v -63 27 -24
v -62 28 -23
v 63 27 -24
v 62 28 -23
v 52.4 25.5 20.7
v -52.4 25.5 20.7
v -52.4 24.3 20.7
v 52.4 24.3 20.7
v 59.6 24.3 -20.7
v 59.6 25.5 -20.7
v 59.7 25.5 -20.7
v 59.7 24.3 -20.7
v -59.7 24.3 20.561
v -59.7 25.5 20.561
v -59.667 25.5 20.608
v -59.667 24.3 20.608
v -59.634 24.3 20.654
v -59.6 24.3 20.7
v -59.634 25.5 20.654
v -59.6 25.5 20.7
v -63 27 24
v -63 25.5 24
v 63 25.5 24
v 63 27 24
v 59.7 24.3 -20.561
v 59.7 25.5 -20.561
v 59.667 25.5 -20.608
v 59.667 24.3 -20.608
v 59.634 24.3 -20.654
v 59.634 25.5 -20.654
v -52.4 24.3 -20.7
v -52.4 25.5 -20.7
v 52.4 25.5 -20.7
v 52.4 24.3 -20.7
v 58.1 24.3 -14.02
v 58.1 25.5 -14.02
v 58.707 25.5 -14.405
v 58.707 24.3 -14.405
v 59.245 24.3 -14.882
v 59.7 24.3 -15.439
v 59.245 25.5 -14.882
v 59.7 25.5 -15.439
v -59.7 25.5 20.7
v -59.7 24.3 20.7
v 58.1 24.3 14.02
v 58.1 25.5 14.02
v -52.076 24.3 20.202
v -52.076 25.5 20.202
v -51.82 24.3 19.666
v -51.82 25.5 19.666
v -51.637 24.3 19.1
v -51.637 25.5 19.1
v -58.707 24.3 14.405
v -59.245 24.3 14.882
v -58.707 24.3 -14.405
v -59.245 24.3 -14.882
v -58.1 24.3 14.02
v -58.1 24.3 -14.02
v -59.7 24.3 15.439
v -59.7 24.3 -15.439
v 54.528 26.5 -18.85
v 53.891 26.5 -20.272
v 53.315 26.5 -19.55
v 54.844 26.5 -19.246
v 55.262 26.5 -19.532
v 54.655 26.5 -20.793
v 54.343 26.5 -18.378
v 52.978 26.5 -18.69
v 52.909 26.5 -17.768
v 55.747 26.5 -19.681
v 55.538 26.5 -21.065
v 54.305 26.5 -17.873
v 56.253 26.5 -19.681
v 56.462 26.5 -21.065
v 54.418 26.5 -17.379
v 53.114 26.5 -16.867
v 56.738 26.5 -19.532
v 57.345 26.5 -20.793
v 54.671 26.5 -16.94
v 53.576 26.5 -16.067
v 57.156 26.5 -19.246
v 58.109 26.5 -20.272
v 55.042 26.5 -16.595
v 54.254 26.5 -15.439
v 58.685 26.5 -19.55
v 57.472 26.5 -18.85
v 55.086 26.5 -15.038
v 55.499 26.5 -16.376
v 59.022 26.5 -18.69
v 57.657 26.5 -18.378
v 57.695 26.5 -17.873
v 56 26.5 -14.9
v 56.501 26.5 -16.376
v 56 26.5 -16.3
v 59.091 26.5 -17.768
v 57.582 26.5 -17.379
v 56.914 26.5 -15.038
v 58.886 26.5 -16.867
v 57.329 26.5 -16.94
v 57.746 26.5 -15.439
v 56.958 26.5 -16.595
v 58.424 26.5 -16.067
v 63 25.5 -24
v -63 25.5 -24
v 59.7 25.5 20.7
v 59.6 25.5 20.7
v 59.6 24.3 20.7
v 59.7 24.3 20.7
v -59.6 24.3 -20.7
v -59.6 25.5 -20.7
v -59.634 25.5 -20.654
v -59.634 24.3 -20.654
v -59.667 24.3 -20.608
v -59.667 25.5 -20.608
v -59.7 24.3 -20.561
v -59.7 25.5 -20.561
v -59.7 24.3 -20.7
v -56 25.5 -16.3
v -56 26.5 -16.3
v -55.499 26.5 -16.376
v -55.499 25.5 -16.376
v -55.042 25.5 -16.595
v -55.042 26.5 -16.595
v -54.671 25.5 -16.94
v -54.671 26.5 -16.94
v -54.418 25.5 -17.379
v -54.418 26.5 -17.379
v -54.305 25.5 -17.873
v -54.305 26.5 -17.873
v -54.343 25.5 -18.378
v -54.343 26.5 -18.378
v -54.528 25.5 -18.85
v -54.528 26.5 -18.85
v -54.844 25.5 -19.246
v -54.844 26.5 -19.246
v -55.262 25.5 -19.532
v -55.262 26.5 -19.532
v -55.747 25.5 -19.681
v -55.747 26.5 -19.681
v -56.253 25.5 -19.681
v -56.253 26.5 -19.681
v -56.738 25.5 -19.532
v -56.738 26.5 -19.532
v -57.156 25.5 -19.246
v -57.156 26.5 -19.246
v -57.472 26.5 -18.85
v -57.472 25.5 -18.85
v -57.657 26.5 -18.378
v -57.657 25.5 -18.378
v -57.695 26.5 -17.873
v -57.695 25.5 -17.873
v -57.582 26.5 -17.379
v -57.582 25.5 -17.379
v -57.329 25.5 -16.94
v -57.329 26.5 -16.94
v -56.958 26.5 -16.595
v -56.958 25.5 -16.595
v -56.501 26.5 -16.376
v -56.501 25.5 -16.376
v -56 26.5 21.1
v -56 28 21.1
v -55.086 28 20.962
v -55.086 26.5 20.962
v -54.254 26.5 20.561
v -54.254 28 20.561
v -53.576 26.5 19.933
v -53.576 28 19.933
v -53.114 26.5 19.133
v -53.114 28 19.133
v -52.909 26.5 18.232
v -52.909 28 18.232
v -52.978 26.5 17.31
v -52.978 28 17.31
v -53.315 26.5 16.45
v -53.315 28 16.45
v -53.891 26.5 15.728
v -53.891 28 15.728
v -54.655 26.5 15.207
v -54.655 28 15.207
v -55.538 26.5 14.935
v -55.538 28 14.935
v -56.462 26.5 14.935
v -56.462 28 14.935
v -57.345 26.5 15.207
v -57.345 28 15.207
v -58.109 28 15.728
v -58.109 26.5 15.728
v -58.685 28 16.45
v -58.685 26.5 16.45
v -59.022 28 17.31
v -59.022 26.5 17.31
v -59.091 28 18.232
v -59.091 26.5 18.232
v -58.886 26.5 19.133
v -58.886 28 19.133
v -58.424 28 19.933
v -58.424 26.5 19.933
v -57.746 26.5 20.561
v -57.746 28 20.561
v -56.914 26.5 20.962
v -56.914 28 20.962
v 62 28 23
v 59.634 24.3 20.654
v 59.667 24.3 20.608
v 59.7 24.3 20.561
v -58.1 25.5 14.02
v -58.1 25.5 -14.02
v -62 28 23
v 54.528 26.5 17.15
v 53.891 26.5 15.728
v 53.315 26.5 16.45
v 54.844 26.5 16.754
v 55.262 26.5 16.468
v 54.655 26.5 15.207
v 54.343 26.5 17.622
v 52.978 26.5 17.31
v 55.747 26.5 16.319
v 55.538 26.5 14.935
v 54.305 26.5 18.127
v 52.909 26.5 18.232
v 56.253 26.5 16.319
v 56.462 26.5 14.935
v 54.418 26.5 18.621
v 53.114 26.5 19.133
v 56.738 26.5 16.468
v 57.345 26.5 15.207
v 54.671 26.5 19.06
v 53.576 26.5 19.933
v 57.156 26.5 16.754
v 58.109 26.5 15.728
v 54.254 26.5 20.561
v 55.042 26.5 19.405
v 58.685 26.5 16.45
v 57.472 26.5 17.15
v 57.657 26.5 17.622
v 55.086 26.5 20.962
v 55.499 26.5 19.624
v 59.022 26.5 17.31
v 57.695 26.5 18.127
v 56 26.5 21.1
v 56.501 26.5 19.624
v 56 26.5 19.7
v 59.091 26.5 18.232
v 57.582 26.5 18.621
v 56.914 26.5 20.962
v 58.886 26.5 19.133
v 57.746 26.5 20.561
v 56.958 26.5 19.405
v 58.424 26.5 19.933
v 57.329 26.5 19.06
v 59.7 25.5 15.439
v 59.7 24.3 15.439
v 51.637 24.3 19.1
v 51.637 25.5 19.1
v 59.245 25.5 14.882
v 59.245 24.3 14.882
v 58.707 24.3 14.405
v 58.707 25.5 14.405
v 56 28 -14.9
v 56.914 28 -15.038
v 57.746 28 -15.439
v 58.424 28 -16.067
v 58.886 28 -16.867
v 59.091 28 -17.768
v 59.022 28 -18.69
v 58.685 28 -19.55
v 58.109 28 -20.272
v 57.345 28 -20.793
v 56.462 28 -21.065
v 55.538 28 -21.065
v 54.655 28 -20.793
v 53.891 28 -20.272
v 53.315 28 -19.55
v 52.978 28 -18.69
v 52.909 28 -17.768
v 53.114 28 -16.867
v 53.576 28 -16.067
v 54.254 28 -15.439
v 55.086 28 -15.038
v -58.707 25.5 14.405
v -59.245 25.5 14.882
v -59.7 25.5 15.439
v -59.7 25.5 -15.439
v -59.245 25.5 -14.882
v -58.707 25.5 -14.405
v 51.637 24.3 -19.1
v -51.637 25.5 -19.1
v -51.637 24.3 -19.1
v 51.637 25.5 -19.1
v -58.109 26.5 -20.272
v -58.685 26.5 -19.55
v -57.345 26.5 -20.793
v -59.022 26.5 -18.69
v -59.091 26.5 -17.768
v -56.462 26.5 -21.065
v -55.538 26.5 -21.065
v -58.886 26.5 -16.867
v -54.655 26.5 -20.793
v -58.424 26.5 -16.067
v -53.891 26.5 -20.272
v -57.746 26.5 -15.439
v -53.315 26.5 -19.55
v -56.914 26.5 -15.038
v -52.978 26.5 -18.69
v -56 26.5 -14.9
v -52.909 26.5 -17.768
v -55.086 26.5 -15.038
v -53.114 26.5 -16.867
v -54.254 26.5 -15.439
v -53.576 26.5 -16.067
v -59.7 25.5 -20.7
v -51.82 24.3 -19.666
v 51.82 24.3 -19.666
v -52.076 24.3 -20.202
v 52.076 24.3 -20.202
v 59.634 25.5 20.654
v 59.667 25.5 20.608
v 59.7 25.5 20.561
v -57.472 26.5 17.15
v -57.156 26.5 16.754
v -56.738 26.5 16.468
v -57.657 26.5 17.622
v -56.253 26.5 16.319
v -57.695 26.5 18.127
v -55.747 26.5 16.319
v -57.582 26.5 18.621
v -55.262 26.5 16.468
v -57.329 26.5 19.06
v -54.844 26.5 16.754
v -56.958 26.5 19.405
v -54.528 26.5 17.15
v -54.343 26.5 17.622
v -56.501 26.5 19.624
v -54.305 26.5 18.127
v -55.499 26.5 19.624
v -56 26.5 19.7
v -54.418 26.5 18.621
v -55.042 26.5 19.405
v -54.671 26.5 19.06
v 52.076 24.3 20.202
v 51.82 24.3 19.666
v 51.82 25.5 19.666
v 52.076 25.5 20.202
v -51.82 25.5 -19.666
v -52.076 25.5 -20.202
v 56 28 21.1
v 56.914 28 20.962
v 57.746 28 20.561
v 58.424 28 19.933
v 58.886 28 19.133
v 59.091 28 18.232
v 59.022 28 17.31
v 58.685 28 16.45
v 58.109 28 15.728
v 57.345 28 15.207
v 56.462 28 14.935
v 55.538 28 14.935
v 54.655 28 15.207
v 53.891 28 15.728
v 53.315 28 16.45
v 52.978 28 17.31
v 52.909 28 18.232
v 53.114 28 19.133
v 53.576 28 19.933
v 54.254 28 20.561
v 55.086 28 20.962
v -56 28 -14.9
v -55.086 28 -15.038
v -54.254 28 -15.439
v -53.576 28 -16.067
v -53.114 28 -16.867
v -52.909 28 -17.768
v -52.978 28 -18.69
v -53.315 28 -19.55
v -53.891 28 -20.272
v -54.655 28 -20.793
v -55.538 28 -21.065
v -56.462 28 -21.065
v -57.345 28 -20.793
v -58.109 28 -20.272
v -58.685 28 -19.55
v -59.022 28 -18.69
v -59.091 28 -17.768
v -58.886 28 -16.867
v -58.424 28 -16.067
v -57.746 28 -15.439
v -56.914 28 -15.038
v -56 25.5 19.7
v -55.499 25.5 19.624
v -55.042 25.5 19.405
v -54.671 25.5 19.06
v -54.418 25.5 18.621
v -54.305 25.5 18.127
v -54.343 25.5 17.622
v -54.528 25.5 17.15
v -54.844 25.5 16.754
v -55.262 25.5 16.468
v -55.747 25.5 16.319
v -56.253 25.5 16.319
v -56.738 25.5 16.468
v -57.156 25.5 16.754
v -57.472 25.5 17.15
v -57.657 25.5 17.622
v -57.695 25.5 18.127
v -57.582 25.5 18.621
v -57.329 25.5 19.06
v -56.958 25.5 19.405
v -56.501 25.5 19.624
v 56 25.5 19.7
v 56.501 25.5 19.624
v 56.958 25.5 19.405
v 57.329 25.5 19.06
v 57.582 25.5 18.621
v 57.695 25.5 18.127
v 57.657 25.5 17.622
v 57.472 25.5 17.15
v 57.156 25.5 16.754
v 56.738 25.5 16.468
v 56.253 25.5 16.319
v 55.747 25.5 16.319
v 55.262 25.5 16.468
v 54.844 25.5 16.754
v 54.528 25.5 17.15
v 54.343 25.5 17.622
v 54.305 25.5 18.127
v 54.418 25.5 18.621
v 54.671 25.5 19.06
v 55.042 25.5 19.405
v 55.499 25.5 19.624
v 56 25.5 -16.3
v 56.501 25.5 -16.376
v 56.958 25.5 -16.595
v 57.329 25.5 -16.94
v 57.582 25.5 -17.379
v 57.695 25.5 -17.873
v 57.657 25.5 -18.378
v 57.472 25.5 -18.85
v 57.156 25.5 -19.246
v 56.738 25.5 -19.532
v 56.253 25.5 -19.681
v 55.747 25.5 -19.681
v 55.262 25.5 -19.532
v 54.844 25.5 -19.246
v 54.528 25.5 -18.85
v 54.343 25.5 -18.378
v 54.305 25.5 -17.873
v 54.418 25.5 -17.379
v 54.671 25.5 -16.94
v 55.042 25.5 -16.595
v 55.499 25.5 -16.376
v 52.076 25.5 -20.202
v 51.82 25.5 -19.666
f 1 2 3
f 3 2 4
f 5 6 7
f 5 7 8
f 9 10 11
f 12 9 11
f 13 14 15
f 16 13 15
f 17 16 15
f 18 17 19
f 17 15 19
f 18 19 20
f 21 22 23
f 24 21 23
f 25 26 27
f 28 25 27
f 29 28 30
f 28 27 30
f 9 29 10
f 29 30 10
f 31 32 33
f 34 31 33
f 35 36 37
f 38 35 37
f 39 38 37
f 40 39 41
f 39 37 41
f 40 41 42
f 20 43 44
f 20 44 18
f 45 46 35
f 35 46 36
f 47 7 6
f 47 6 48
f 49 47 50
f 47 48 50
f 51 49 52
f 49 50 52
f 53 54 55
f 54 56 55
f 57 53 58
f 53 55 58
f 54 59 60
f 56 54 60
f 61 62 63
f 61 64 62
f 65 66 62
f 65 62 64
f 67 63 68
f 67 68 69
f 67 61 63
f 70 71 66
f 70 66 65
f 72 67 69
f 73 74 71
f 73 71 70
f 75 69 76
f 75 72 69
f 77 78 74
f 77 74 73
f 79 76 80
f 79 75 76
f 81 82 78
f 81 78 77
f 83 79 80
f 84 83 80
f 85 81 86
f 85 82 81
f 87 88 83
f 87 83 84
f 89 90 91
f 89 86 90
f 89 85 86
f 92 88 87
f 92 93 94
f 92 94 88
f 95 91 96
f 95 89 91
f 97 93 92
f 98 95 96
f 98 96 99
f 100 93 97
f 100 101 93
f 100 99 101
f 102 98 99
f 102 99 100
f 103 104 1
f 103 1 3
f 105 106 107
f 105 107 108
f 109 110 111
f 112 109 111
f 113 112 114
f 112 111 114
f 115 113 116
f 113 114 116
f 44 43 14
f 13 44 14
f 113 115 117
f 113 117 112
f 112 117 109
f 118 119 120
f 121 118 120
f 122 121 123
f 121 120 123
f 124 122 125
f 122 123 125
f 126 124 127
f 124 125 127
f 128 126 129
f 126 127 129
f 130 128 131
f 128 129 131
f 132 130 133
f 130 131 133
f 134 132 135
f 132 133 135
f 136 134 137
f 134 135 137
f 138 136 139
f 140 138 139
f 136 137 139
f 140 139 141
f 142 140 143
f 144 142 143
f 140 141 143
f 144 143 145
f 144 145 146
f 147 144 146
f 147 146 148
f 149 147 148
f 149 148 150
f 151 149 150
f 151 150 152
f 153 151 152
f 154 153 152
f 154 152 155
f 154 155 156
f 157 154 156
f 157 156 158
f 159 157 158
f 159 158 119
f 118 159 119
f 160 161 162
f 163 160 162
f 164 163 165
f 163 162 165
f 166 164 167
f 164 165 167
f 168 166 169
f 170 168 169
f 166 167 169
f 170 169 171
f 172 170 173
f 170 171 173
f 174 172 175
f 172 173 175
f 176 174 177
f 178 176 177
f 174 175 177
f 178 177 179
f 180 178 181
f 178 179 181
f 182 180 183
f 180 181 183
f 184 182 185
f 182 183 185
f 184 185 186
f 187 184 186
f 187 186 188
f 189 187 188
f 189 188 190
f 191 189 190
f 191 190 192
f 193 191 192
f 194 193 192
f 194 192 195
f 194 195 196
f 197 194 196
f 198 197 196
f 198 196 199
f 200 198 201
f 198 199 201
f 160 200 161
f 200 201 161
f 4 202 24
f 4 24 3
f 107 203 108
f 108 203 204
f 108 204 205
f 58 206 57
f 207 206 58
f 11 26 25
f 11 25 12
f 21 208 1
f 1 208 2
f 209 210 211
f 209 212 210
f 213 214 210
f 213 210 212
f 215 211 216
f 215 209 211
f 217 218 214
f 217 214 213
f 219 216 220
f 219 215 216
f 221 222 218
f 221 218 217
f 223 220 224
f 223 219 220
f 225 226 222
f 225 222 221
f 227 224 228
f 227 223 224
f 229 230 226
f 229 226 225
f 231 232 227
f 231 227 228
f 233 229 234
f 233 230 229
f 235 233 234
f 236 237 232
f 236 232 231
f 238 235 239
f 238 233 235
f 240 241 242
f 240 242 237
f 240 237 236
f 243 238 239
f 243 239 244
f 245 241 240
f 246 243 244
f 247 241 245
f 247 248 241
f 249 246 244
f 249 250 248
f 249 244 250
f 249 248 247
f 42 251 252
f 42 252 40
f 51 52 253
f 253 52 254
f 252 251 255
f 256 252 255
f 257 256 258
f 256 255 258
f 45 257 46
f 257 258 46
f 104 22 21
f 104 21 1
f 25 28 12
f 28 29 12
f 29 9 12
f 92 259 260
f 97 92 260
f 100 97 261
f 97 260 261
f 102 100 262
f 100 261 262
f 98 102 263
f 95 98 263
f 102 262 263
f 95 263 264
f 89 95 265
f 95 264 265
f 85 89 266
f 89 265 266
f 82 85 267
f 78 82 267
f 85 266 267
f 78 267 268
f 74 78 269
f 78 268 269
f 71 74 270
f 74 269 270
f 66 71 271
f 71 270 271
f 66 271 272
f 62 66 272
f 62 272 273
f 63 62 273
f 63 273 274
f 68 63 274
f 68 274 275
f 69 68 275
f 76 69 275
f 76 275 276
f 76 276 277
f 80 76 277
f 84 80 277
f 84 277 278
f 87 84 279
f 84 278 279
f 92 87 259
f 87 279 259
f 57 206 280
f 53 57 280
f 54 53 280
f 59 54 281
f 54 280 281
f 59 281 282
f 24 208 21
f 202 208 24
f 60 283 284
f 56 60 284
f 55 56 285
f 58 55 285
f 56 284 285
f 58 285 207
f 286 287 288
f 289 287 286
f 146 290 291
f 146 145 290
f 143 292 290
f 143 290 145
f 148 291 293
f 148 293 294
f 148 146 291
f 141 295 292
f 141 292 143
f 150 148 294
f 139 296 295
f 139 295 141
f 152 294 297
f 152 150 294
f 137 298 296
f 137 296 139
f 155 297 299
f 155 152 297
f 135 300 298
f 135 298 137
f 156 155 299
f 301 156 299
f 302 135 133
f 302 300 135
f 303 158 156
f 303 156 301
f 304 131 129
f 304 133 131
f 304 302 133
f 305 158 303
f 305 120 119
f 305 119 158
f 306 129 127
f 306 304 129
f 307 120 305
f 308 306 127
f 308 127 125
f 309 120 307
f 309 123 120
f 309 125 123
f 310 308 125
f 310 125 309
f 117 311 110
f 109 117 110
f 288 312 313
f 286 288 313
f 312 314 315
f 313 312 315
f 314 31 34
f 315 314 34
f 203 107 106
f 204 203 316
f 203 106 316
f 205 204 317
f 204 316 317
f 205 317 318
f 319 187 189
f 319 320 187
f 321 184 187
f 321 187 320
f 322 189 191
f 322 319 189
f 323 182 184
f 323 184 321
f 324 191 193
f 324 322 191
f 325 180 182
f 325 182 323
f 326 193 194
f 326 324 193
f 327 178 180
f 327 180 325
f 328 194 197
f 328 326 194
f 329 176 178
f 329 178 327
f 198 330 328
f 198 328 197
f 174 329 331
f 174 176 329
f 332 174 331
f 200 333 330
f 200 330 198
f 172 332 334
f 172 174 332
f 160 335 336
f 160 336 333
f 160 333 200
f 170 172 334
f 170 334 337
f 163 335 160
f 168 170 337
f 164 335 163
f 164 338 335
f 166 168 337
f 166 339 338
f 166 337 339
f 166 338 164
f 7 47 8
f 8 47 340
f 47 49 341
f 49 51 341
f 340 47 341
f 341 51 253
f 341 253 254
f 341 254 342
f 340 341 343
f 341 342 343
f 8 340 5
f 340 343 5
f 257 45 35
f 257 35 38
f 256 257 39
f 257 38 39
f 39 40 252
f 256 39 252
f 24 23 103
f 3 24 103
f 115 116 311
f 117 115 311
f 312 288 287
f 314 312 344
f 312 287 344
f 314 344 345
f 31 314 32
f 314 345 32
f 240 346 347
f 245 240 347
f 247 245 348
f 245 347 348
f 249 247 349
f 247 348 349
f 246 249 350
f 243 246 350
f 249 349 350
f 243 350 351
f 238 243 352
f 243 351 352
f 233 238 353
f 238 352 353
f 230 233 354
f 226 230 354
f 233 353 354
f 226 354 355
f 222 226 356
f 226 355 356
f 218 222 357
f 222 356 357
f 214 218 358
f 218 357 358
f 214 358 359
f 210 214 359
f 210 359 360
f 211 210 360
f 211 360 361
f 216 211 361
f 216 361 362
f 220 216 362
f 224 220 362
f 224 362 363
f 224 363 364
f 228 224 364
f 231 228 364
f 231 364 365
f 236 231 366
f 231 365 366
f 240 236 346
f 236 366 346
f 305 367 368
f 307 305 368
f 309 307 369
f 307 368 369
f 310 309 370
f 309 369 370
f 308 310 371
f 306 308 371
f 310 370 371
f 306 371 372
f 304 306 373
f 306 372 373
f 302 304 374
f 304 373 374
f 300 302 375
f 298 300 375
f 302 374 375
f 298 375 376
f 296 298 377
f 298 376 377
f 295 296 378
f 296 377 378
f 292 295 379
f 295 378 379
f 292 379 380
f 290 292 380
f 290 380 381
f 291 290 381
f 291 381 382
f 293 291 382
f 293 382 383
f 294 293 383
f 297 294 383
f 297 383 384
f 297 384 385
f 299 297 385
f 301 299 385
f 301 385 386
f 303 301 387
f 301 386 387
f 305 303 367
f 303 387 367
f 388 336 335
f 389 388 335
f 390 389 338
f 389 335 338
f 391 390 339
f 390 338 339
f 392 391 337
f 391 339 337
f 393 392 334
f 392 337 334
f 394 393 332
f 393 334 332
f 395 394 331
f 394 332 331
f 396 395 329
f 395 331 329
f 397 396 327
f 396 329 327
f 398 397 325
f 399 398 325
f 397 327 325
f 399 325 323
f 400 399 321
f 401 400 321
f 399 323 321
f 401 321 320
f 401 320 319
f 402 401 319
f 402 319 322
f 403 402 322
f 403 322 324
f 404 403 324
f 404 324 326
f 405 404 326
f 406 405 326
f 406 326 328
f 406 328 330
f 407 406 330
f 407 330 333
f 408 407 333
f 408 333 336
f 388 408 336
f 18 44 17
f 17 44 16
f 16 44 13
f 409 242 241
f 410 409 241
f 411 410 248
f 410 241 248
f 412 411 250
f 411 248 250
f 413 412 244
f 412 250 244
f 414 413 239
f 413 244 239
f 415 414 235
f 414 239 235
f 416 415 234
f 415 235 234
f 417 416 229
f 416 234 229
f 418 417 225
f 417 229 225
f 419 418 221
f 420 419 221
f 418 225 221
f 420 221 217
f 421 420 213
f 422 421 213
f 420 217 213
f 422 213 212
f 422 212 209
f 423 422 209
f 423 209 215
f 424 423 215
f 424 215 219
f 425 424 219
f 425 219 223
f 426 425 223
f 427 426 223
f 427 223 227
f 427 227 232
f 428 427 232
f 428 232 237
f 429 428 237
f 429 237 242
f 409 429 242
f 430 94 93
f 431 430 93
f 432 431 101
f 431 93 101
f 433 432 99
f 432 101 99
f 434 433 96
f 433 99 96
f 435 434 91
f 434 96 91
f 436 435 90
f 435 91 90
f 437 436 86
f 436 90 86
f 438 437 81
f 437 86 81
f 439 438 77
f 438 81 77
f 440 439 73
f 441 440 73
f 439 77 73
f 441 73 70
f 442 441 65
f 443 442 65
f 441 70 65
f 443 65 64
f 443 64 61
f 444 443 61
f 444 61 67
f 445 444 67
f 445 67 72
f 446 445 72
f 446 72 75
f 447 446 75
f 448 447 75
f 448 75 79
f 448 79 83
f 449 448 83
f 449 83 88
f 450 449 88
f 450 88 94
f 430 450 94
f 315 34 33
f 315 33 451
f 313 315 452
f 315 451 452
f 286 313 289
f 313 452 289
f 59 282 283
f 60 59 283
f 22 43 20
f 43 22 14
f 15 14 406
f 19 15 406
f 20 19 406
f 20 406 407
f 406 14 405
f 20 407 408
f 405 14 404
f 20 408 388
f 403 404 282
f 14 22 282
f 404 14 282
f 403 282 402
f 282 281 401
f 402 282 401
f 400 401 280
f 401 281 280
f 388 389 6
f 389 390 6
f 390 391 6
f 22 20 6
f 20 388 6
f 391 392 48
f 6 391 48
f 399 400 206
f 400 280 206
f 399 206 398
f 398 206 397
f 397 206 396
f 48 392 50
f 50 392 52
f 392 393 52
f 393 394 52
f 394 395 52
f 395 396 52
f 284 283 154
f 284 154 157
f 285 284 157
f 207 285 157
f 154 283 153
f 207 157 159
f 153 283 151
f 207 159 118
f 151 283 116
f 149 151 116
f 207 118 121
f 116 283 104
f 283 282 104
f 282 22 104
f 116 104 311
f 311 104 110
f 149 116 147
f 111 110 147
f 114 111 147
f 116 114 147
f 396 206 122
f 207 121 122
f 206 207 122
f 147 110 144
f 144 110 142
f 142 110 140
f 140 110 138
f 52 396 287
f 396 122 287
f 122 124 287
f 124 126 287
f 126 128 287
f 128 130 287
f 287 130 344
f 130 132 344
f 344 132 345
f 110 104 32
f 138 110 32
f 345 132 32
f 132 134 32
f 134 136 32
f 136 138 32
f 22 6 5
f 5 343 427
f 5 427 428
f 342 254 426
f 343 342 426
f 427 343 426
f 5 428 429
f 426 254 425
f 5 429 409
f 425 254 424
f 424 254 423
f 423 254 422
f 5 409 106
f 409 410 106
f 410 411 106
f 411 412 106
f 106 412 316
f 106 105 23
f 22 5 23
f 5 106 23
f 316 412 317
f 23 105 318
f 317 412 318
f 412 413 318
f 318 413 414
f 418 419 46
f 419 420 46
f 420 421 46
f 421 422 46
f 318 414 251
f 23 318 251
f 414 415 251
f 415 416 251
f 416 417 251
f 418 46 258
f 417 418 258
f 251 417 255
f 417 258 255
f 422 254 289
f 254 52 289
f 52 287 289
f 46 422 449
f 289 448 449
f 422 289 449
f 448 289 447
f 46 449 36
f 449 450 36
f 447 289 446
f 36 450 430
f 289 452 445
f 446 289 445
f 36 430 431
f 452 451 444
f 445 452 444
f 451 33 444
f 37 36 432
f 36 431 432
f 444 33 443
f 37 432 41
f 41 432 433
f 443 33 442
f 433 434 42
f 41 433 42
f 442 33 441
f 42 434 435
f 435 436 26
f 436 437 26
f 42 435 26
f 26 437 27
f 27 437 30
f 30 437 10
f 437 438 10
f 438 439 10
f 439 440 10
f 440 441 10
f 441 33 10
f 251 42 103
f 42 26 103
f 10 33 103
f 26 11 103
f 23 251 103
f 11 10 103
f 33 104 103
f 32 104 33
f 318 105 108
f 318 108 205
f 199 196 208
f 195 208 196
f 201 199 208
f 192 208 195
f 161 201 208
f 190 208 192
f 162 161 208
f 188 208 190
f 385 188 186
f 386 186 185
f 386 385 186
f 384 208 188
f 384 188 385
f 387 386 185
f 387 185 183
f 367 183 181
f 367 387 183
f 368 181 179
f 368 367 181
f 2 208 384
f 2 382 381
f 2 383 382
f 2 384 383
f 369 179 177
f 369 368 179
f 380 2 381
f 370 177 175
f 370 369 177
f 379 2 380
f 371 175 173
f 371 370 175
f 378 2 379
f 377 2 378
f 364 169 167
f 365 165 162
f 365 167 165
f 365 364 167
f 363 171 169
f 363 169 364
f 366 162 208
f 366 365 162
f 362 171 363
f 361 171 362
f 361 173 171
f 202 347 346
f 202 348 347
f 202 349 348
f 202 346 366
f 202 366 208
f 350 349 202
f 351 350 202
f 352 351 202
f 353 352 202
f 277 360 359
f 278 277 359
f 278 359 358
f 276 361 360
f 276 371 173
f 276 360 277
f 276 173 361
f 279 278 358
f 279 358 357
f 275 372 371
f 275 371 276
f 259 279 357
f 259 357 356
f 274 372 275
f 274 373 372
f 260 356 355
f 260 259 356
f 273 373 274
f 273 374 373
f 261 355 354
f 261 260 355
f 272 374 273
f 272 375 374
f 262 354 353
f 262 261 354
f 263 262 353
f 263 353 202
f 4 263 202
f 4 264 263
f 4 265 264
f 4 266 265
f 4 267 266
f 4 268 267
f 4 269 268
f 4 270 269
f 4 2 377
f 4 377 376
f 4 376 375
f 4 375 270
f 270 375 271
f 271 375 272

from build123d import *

# Parameters (mm, degrees)
SKETCH1_W           = 126
SKETCH1_H           = 48
BOSS_EXTRUDE1_DEPTH = 2.5
CHAMFER1_SIZE       = 1
SKETCH2_W           = 119.4
SKETCH2_H           = 41.4
SKETCH2_W_2         = 116.2
SKETCH2_H_2         = 38.2
BOSS_EXTRUDE2_DEPTH = 1.2
SKETCH3_R           = 4.5
CUT_EXTRUDE1_DEPTH  = 1.5
SKETCH4_R           = 1.7
CUT_EXTRUDE2_DEPTH  = 68.518071655
SKETCH5_R           = 3.1
CUT_EXTRUDE3_DEPTH  = 1.5


with BuildPart() as part:
    # Sketch1 → Boss-Extrude1 (new body)
    with BuildSketch(Plane(origin=(0, 25.5, 0), x_dir=(1, 0, 0), z_dir=(0, 1, 0))):
        Rectangle(SKETCH1_W, SKETCH1_H)
    extrude(amount=BOSS_EXTRUDE1_DEPTH)

    # Chamfer1
    chamfer1_edges = [part.edges().sort_by_distance(p)[0] for p in [
        (63, 28, 0),
        (0, 28, -24),
        (-63, 28, 0),
        (0, 28, 24),
    ]]
    chamfer(chamfer1_edges, length=CHAMFER1_SIZE)

    # Sketch2 → Boss-Extrude2 (add)
    with BuildSketch(Plane(origin=(0, 25.5, 0), x_dir=(1, 0, 0), z_dir=(0, 1, 0))):
        Rectangle(SKETCH2_W, SKETCH2_H)
        Rectangle(SKETCH2_W_2, SKETCH2_H_2, mode=Mode.SUBTRACT)
    extrude(amount=-BOSS_EXTRUDE2_DEPTH)

    # Sketch3 → Cut-Extrude1 (cut)
    with BuildSketch(Plane(origin=(0, 25.5, 0), x_dir=(1, 0, 0), z_dir=(0, 1, 0))):
        with Locations((-56, 18)):
            Circle(SKETCH3_R)
        with Locations((-56, -18)):
            Circle(SKETCH3_R)
        with Locations((56, 18)):
            Circle(SKETCH3_R)
        with Locations((56, -18)):
            Circle(SKETCH3_R)
    extrude(amount=-CUT_EXTRUDE1_DEPTH, mode=Mode.SUBTRACT)

    # Sketch4 → Cut-Extrude2 (cut, through all)
    with BuildSketch(Plane(origin=(0, 28, 0), x_dir=(1, 0, 0), z_dir=(0, 1, 0))):
        with Locations(Location((-56, 18, 0), (0, 0, 270))):
            Circle(SKETCH4_R)
        with Locations(Location((-56, -18, 0), (0, 0, 270))):
            Circle(SKETCH4_R)
        with Locations(Location((56, 18, 0), (0, 0, 270))):
            Circle(SKETCH4_R)
        with Locations(Location((56, -18, 0), (0, 0, 270))):
            Circle(SKETCH4_R)
    extrude(amount=-CUT_EXTRUDE2_DEPTH, mode=Mode.SUBTRACT)

    # Sketch5 → Cut-Extrude3 (cut)
    with BuildSketch(Plane(origin=(0, 28, 0), x_dir=(1, 0, 0), z_dir=(0, 1, 0))):
        with Locations(Location((-56, 18, 0), (0, 0, 270))):
            Circle(SKETCH5_R)
        with Locations(Location((-56, -18, 0), (0, 0, 270))):
            Circle(SKETCH5_R)
        with Locations(Location((56, 18, 0), (0, 0, 270))):
            Circle(SKETCH5_R)
        with Locations(Location((56, -18, 0), (0, 0, 270))):
            Circle(SKETCH5_R)
    extrude(amount=-CUT_EXTRUDE3_DEPTH, mode=Mode.SUBTRACT)


solid = part.part
